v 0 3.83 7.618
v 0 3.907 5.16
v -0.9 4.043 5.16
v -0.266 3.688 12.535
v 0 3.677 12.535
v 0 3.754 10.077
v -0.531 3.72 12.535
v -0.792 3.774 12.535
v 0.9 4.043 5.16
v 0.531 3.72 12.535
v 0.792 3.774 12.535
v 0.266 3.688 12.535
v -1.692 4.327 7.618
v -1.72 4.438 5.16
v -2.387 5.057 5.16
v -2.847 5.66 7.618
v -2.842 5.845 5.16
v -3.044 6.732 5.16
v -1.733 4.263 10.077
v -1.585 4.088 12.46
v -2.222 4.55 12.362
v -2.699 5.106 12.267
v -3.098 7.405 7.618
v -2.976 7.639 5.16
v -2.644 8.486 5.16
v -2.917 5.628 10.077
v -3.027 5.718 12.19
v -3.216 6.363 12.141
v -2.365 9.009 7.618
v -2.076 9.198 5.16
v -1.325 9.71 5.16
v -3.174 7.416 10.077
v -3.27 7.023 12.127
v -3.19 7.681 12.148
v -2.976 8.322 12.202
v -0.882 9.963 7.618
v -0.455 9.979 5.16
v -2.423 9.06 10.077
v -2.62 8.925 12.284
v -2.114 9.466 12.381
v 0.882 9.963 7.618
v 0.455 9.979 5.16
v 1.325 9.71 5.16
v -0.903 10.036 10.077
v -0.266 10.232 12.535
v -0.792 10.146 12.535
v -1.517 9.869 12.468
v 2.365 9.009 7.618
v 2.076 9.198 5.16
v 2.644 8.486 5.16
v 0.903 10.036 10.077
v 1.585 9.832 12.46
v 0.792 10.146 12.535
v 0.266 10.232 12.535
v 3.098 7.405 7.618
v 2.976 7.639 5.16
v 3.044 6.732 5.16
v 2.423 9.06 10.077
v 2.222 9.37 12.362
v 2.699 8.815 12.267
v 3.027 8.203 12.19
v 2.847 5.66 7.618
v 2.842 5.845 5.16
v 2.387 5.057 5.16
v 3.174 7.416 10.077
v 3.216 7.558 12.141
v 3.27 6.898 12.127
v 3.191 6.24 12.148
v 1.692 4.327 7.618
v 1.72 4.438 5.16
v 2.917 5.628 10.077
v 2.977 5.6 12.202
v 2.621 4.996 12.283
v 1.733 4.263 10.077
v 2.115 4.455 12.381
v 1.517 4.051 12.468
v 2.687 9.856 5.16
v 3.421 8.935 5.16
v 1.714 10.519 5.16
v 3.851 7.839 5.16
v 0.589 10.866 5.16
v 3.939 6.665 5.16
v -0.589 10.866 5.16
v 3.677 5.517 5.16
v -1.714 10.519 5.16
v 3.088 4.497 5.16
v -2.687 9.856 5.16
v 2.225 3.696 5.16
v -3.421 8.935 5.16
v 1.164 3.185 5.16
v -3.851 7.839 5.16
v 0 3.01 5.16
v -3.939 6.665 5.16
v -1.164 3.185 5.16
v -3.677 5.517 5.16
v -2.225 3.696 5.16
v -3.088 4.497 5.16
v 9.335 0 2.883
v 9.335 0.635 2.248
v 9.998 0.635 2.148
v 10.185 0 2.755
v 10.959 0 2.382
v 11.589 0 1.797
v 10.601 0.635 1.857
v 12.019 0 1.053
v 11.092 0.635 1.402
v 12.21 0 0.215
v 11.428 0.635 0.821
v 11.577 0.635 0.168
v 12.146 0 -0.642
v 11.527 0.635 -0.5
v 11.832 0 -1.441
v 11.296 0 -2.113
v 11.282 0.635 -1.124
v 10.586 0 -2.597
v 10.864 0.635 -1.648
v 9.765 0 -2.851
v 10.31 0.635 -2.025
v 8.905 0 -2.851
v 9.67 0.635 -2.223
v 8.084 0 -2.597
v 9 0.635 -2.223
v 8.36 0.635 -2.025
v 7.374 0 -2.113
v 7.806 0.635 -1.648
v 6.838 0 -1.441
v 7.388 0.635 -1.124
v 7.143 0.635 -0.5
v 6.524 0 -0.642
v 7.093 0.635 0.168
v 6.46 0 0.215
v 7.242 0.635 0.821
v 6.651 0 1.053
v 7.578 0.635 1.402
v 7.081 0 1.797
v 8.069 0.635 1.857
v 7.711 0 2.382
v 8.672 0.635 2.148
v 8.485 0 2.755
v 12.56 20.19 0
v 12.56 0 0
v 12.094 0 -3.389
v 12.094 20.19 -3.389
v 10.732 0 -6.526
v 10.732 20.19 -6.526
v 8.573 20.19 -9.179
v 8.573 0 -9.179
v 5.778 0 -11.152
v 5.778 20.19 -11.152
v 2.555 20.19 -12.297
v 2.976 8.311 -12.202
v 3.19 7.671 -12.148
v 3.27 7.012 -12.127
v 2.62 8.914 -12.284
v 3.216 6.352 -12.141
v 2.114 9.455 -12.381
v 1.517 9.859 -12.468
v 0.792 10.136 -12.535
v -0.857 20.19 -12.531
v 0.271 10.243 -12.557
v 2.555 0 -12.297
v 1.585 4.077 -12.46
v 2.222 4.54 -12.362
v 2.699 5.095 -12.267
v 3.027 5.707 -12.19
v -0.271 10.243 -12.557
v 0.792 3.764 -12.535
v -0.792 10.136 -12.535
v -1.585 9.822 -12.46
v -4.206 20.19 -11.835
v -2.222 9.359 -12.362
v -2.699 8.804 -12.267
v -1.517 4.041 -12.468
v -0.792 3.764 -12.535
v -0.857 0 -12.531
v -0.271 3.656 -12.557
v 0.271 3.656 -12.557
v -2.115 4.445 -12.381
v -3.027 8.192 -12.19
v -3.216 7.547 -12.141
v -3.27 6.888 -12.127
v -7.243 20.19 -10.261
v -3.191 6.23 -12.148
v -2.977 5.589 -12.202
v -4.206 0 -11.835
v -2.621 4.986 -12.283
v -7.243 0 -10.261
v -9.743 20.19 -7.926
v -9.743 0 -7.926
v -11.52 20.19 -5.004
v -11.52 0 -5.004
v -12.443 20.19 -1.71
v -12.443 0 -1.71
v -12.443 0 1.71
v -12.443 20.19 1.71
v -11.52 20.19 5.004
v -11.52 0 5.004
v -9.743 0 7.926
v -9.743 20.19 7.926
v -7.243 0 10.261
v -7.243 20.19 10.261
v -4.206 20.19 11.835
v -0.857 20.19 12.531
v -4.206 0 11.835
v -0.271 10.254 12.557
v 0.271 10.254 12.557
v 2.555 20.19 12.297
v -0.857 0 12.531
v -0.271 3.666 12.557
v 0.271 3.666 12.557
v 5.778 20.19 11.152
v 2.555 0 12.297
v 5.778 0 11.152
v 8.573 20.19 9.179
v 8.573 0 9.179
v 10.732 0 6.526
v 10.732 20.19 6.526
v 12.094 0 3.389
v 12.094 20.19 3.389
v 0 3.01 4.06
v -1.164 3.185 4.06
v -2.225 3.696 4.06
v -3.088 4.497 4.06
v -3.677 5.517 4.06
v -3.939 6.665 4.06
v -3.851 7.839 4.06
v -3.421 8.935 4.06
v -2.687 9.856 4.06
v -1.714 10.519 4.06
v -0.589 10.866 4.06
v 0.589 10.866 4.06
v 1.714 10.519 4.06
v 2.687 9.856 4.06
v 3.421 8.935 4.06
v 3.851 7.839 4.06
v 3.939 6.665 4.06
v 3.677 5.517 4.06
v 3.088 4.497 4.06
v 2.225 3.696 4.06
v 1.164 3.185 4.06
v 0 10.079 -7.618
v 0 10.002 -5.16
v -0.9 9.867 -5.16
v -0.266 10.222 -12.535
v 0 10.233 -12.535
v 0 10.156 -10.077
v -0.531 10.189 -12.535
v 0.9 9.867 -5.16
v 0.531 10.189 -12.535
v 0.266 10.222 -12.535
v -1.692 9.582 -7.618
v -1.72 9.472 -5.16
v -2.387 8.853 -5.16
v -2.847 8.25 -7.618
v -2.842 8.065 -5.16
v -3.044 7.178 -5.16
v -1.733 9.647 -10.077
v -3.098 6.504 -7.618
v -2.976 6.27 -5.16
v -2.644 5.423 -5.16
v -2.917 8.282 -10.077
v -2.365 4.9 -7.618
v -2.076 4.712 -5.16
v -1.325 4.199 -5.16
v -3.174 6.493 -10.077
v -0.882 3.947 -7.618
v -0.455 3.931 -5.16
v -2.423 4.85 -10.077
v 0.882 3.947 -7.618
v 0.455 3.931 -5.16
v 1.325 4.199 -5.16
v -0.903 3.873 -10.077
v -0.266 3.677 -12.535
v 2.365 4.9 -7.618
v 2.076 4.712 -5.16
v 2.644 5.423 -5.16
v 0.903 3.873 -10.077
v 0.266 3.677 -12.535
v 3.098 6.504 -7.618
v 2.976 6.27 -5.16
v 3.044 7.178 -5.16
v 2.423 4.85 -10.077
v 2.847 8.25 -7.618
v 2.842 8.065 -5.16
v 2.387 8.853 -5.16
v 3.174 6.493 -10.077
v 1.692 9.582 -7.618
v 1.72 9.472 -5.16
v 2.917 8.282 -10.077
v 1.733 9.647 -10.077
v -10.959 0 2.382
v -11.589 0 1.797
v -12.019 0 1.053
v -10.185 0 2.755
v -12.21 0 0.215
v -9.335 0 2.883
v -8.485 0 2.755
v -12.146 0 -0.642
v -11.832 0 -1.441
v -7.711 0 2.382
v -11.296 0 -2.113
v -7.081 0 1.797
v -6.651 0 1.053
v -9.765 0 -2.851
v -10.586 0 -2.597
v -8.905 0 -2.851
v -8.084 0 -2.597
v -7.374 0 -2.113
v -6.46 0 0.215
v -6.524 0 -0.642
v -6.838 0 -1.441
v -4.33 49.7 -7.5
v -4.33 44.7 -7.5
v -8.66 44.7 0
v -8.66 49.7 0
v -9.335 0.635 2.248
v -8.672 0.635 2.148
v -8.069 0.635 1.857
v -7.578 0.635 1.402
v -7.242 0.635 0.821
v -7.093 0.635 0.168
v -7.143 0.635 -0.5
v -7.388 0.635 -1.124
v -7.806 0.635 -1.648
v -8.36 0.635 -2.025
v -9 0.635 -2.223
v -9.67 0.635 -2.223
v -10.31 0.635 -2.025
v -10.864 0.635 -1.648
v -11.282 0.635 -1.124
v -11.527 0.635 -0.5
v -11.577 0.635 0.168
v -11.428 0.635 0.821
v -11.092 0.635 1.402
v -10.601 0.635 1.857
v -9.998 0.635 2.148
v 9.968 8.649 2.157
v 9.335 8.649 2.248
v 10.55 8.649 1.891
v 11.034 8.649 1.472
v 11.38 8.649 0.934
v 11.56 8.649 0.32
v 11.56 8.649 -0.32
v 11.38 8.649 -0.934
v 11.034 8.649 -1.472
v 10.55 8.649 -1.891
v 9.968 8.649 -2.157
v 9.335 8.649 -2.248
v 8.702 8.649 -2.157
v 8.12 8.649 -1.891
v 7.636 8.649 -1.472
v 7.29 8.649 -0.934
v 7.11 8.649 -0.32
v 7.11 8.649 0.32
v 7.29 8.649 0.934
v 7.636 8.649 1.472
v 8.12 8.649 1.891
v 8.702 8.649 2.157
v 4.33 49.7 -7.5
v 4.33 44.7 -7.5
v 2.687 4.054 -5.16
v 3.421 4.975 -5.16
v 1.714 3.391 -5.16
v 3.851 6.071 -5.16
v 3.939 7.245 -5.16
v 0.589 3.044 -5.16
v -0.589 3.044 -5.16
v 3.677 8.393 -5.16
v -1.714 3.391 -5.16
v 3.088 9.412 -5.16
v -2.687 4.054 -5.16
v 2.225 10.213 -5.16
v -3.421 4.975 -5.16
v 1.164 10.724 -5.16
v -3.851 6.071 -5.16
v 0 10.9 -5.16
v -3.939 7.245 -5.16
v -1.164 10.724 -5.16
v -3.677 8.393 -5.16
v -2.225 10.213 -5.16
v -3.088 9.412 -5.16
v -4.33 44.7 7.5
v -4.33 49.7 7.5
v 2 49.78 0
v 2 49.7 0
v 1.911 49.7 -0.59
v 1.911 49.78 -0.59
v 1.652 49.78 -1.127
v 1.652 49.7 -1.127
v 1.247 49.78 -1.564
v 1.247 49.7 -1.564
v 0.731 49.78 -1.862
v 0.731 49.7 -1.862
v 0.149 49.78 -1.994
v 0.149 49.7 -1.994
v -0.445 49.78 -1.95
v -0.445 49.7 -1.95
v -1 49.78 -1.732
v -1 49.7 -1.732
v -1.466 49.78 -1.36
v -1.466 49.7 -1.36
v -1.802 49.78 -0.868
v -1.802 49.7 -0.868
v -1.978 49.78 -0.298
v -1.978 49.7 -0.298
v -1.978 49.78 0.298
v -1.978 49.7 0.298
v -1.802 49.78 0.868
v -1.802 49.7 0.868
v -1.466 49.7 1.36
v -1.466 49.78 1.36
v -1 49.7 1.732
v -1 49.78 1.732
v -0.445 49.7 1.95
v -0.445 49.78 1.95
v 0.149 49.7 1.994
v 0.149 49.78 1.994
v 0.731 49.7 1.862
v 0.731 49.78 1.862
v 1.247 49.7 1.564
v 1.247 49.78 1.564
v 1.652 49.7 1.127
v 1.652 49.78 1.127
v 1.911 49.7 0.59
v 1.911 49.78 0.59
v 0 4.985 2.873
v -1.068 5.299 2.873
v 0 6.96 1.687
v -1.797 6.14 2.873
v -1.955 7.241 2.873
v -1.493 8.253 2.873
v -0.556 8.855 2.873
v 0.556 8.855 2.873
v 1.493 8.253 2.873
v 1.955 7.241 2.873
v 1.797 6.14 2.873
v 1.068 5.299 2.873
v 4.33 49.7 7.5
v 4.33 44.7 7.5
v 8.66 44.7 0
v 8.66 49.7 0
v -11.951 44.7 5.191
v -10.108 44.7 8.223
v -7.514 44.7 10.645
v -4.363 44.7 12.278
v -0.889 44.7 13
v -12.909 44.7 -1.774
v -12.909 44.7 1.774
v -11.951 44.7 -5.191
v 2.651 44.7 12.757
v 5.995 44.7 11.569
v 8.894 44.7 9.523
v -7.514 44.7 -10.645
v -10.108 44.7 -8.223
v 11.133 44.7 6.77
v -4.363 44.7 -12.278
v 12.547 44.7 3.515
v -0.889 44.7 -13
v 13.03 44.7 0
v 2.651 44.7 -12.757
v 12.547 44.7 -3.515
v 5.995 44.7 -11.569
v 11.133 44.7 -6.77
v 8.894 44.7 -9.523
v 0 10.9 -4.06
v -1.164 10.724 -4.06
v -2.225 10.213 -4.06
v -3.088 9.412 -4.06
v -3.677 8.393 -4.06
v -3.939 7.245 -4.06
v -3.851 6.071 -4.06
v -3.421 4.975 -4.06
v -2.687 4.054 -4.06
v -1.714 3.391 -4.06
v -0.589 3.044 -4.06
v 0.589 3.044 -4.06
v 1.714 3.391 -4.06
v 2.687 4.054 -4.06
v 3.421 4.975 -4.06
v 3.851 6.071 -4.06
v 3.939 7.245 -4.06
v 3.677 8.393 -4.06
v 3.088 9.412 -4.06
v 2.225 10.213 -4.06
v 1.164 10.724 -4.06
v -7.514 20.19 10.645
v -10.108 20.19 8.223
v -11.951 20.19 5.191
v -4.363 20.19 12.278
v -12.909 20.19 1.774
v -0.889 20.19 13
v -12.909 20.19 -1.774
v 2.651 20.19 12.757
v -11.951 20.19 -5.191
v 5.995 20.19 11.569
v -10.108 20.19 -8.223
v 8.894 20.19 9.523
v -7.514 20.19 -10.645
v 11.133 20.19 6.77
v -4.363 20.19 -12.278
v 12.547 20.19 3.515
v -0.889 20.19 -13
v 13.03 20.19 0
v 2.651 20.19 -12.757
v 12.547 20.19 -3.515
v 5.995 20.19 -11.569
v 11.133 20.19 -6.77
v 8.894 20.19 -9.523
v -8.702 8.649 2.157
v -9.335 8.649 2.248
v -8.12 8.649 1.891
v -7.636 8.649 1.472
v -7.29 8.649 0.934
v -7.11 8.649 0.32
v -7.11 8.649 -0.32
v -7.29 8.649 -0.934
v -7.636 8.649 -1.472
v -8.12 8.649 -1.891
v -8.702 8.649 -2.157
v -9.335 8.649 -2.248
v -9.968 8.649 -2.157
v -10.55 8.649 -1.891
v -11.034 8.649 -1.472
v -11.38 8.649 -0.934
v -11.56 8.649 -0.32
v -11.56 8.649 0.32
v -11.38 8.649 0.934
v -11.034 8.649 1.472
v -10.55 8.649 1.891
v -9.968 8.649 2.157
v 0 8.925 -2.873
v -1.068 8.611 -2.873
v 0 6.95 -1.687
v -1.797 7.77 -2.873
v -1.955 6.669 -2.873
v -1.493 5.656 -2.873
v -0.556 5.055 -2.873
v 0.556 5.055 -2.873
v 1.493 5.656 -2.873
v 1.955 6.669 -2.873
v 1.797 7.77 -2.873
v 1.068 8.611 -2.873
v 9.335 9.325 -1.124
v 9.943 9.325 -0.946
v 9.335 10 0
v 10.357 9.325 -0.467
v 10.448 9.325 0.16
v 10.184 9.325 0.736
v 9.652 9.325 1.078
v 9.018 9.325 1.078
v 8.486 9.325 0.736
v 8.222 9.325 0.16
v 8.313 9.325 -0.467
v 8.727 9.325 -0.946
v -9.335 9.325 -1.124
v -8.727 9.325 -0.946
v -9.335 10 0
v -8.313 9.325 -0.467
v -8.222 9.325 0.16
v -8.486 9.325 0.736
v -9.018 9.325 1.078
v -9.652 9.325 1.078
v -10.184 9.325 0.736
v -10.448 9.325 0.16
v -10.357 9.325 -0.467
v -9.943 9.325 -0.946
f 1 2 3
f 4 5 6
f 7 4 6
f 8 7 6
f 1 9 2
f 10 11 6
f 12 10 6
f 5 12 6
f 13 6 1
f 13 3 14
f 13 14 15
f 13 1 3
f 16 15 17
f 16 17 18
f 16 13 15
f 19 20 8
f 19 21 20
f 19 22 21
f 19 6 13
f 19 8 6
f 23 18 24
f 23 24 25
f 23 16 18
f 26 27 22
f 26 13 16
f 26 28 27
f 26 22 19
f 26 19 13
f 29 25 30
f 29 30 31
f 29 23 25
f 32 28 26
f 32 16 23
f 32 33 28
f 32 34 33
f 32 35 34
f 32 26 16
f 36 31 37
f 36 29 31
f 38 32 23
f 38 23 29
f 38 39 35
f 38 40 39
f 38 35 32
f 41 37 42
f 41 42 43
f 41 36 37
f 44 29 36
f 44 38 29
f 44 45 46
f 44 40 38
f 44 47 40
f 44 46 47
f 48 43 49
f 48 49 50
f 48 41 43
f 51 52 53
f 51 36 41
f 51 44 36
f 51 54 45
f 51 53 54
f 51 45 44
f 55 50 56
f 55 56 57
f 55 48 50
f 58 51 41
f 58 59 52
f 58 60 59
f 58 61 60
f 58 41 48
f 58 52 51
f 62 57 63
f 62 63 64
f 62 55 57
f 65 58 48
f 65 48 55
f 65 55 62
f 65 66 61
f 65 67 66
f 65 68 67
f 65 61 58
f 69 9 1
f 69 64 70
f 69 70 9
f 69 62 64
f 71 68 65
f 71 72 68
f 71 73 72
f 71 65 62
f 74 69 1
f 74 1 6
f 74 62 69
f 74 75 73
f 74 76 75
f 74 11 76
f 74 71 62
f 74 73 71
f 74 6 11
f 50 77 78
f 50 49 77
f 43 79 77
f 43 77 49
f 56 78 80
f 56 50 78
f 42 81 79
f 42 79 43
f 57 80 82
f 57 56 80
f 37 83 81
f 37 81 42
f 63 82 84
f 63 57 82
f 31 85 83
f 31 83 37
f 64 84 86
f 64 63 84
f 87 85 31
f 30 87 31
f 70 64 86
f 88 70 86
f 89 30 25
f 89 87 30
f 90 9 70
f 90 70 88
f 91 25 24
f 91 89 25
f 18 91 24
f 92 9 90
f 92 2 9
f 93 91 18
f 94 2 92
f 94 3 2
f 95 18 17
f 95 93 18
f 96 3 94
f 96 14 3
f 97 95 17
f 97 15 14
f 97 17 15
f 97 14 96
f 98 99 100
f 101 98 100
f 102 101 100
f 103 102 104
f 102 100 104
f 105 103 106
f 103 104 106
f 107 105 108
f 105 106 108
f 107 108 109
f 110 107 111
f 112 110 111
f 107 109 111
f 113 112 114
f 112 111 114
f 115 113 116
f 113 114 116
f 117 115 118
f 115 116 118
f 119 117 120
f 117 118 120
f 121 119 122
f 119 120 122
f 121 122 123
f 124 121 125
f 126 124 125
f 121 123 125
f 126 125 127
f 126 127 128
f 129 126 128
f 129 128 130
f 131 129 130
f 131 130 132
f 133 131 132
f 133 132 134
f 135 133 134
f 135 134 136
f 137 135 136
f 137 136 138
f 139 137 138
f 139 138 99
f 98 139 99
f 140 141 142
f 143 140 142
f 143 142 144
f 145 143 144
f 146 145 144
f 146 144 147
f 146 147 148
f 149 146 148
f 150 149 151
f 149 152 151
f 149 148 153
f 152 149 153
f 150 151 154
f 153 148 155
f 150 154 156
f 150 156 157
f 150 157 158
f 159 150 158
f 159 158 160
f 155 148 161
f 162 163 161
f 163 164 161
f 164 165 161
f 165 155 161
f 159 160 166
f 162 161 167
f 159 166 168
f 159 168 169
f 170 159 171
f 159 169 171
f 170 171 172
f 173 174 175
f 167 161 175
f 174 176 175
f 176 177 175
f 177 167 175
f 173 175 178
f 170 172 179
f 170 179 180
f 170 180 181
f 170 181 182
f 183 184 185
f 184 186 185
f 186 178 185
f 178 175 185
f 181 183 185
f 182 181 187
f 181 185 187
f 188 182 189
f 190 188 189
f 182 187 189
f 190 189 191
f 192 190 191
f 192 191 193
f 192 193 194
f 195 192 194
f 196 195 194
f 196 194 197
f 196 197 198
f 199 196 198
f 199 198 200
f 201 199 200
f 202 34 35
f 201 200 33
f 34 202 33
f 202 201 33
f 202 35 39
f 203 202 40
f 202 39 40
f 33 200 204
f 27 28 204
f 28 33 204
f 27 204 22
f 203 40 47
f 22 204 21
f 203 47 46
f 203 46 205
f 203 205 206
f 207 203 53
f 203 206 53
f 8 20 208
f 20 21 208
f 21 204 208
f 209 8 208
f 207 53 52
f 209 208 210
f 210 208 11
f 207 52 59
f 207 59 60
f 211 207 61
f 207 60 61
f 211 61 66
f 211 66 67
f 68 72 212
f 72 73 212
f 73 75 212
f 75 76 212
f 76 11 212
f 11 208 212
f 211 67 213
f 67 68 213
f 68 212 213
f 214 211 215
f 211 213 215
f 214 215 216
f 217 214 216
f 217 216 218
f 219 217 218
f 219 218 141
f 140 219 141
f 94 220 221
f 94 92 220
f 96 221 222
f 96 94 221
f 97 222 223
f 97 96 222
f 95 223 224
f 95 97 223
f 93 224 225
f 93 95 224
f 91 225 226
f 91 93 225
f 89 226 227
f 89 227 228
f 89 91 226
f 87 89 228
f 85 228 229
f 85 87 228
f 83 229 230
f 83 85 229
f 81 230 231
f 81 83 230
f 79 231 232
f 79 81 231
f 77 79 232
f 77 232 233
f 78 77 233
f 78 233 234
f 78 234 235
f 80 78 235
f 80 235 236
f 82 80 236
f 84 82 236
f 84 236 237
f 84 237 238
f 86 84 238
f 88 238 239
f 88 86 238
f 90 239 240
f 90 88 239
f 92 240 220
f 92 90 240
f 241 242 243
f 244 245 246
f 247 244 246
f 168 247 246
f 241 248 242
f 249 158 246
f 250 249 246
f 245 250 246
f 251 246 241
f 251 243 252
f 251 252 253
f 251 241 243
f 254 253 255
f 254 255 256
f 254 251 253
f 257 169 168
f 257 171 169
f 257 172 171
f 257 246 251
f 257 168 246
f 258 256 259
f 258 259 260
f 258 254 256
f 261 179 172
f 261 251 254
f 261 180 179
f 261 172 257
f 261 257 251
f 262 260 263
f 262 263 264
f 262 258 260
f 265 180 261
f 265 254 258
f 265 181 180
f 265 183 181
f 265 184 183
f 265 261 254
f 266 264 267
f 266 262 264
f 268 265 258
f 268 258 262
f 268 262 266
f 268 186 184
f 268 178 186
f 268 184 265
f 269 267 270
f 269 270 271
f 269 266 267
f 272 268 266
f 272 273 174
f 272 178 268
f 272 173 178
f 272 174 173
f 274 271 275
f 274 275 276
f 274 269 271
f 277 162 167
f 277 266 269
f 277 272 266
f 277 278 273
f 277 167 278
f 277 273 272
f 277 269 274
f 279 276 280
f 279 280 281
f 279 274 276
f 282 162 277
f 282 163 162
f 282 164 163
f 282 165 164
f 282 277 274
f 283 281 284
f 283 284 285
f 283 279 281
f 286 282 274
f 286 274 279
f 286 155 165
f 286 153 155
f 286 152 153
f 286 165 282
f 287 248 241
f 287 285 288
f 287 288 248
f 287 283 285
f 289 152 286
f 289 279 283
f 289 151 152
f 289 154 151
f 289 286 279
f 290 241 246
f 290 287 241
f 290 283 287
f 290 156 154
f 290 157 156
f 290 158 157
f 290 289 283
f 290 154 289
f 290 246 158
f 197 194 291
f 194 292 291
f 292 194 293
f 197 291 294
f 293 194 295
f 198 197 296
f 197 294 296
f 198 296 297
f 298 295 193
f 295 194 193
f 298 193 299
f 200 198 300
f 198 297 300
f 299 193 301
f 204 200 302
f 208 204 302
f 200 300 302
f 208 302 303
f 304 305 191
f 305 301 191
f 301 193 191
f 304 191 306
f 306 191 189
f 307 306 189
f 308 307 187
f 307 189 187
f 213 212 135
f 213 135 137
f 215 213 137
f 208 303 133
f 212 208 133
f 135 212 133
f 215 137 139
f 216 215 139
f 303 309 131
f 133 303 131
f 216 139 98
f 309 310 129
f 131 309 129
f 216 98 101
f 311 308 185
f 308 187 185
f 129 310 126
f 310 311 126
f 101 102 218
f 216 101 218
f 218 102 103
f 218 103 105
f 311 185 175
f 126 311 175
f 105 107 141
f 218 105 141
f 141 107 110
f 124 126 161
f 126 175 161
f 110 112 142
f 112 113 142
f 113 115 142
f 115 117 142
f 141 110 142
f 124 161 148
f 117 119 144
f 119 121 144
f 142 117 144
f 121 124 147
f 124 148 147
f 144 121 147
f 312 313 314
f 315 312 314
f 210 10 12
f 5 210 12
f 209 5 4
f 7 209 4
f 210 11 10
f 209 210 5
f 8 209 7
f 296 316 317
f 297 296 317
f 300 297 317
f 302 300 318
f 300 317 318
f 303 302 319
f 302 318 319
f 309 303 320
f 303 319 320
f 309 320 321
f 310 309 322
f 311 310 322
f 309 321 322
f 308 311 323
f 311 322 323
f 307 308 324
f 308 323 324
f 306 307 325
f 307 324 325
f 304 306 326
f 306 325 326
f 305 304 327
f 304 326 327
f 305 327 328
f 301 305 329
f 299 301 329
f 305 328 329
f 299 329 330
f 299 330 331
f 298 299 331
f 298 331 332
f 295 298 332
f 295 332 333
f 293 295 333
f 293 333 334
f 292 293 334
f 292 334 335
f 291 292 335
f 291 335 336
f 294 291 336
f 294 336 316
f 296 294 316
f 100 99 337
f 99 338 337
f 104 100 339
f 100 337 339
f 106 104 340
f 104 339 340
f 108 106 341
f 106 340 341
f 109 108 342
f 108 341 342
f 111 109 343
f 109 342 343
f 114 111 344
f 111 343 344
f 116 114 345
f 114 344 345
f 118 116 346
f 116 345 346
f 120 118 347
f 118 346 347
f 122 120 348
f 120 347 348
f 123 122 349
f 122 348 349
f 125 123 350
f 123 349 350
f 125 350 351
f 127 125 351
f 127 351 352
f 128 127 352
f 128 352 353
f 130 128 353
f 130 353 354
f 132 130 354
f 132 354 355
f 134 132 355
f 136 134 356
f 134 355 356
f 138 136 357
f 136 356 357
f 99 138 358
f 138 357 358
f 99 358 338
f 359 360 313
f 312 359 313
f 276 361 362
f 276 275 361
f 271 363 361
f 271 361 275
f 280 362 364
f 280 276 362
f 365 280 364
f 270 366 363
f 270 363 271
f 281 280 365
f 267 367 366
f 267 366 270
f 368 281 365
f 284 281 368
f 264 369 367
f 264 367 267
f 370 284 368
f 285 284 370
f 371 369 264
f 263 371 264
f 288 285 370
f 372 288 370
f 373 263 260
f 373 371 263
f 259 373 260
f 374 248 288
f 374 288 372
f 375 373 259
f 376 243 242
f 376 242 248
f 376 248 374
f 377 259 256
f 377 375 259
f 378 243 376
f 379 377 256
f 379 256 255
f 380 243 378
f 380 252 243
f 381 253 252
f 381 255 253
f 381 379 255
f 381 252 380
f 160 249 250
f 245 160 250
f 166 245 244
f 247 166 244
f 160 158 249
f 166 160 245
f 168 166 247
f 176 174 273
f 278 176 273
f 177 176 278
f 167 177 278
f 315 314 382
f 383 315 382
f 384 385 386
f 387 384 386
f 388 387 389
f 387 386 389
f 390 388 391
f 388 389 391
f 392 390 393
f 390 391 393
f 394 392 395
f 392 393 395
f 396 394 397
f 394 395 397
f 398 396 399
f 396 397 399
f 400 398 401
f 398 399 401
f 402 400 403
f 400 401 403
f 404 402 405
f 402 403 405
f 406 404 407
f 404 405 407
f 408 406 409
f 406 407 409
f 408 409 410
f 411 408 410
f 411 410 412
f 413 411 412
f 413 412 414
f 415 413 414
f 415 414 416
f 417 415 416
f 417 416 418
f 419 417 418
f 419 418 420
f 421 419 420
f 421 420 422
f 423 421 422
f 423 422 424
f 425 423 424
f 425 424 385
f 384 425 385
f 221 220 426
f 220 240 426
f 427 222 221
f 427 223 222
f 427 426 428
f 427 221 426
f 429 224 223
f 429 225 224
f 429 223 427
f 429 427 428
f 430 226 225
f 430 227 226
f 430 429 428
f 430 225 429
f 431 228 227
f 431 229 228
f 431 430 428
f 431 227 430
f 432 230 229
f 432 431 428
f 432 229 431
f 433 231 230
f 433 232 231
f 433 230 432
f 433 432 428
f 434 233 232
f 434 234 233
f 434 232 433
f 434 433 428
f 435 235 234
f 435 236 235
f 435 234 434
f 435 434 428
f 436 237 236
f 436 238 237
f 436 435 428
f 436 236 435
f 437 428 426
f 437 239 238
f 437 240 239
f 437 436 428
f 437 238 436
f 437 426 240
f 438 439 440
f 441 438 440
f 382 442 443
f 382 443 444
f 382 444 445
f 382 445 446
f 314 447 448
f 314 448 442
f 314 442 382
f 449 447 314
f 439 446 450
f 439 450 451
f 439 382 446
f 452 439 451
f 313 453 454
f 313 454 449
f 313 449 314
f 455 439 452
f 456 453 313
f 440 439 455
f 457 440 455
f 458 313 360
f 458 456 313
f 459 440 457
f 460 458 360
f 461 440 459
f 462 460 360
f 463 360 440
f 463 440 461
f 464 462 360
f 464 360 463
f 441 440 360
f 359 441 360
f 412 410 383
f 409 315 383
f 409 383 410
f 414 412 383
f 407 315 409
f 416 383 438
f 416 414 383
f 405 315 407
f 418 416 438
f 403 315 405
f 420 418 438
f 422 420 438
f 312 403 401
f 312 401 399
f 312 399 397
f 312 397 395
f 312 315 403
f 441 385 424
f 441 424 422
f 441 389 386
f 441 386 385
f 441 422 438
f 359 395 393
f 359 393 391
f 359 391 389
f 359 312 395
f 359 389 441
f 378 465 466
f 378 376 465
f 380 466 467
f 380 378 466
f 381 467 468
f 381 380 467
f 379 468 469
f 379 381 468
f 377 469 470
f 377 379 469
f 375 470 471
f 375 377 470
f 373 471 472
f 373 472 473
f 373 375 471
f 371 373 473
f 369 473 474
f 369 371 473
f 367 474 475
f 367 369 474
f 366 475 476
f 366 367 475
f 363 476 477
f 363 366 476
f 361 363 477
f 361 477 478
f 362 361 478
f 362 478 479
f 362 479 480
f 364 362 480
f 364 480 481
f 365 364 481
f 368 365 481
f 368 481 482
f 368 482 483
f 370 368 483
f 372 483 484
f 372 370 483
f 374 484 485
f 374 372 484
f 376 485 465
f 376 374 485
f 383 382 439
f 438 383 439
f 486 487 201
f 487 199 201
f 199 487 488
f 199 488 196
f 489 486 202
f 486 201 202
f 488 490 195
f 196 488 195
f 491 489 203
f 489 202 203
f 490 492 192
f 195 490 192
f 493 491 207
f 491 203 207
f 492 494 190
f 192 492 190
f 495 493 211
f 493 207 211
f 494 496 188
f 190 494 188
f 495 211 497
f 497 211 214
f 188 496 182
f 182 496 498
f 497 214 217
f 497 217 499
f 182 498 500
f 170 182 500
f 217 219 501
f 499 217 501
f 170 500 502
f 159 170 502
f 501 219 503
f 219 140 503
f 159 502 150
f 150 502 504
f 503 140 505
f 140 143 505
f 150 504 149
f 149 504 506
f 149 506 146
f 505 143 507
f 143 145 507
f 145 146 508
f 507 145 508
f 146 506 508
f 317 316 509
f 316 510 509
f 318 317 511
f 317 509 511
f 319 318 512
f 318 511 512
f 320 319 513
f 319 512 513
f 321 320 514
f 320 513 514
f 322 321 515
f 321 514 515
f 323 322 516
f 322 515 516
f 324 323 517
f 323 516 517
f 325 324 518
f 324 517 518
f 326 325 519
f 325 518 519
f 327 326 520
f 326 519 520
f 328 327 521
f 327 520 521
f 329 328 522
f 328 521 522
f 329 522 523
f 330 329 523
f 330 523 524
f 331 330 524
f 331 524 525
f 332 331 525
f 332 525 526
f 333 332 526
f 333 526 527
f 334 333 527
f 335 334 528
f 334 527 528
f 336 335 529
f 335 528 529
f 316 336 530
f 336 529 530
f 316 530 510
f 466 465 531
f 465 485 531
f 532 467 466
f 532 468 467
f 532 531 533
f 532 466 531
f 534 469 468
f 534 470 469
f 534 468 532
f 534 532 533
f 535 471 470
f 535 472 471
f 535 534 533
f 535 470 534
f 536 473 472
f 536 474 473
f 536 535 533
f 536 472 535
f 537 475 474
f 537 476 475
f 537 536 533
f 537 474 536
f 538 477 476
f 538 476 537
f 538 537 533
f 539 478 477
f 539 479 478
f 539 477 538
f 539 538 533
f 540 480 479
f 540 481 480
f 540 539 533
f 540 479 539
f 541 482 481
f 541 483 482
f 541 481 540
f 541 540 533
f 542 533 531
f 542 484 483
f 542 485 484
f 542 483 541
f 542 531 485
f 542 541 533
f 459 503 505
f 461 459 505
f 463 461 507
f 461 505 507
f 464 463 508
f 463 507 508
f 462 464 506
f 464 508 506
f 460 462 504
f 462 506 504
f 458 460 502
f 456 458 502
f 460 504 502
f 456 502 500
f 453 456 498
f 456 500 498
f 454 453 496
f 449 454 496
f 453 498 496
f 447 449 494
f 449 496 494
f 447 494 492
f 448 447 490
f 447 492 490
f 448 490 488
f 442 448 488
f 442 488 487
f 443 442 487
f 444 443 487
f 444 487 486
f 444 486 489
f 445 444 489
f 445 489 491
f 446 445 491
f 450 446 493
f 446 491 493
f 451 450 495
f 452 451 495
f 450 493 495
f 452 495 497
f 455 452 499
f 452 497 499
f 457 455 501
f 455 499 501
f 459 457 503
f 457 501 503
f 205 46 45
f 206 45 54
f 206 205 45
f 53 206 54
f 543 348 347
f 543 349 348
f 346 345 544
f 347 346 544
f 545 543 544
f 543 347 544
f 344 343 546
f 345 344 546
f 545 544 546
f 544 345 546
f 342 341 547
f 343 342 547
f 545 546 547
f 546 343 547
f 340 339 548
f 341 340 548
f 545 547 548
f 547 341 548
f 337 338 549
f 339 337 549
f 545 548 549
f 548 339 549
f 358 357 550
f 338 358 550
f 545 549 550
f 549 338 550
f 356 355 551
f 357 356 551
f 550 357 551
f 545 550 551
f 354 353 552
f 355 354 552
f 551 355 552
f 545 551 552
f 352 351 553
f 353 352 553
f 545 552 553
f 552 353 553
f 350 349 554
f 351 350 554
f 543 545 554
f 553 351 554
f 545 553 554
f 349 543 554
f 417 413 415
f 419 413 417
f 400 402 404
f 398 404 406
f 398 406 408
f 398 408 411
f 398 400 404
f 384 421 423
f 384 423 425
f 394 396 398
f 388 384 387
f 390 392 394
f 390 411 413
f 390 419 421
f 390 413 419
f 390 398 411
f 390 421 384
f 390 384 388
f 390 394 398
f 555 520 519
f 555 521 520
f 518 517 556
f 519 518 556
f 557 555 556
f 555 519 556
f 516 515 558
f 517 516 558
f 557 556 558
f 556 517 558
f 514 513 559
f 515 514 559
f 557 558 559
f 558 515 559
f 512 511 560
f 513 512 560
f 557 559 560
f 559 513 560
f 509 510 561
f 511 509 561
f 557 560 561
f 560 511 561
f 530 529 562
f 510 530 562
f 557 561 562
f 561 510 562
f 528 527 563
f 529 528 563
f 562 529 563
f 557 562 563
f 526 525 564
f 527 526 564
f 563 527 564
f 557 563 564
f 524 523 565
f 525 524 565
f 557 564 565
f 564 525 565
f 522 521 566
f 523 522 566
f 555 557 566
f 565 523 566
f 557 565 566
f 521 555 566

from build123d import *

# Parameters (mm, degrees)
ESQUISSE1_R               = 12.56
BOSS_EXTRU_1_DEPTH        = 20.19
ESQUISSE13_R              = 2
BOSS_EXTRU_2_DEPTH        = 29.59
ESQUISSE14_R              = 13.03
BOSS_EXTRU_3_DEPTH        = 24.51
BOSS_EXTRU_4_DEPTH        = 5
D_GAGEMENT_81_D           = 4.4958
D_GAGEMENT_81_DEPTH       = 8.649325414
D_GAGEMENT_81_CSINK_D     = 5.7658
D_GAGEMENT_81_CSINK_ANGLE = 90
D_GAGEMENT_81_TIP         = 1.350674586


with BuildPart() as part:
    # Esquisse1 → Boss.-Extru.1 (new body)
    with BuildSketch(Plane(origin=(0, 0, 0), x_dir=(1, 0, 0), z_dir=(0, 1, 0))):
        Circle(ESQUISSE1_R)
    extrude(amount=BOSS_EXTRU_1_DEPTH)

    # Esquisse9 → Trou taraudé 1/8 Rc1 (revolve, cut)
    with BuildSketch(Plane(origin=(0, 6.96, 12.56), x_dir=(0, -1, 0), z_dir=(1, 0, 0))):
        Polygon((0, 0), (0, 10.873399445), (3.95, 8.5), (3.95, 7.4), (3.05277742, 7.4), (3.283, 0.025), (3.308, 0), align=None)
    revolve(axis=Axis((0, 6.96, 18.91), (0, 0, -1)), mode=Mode.SUBTRACT)

    # Esquisse12 → Trou taraudé 1/8 Rc2 (revolve, cut)
    with BuildSketch(Plane(origin=(0, 6.949571946, -12.56), x_dir=(0, 1, 0), z_dir=(1, 0, 0))):
        Polygon((0, 0), (0, 10.873399445), (3.95, 8.5), (3.95, 7.4), (3.05277742, 7.4), (3.283, 0.025), (3.308, 0), align=None)
    revolve(axis=Axis((0, 6.949571946, -18.91), (0, 0, 1)), mode=Mode.SUBTRACT)

    # Esquisse13 → Boss.-Extru.2 (add)
    with BuildSketch(Plane(origin=(0, 20.19, 0), x_dir=(1, 0, 0), z_dir=(0, 1, 0))):
        Circle(ESQUISSE13_R)
    extrude(amount=BOSS_EXTRU_2_DEPTH)

    # Esquisse14 → Boss.-Extru.3 (add)
    with BuildSketch(Plane(origin=(0, 20.19, 0), x_dir=(1, 0, 0), z_dir=(0, 1, 0))):
        Circle(ESQUISSE14_R)
    extrude(amount=BOSS_EXTRU_3_DEPTH)

    # Esquisse16 → Boss.-Extru.4 (add)
    with BuildSketch(Plane(origin=(0, 44.7, 0), x_dir=(1, 0, 0), z_dir=(0, 1, 0))):
        Polygon((8.660254038, 0), (4.330127019, 7.5), (-4.330127019, 7.5), (-8.660254038, 0), (-4.330127019, -7.5), (4.330127019, -7.5), align=None)
    extrude(amount=BOSS_EXTRU_4_DEPTH)

    # Dégagement #81
    with Locations(Plane(origin=(-9.335, 0, 0), x_dir=(0, 0, -1), z_dir=(0, -1, 0))):
        with Locations((0, 0), (0, 18.67)):
            CounterSinkHole(D_GAGEMENT_81_D / 2, D_GAGEMENT_81_CSINK_D / 2, depth=D_GAGEMENT_81_DEPTH, counter_sink_angle=D_GAGEMENT_81_CSINK_ANGLE)
            with Locations((0, 0, -(D_GAGEMENT_81_DEPTH + D_GAGEMENT_81_TIP / 2))):  # 118° drill point
                Cone(0, D_GAGEMENT_81_D / 2, D_GAGEMENT_81_TIP, mode=Mode.SUBTRACT)


solid = part.part
